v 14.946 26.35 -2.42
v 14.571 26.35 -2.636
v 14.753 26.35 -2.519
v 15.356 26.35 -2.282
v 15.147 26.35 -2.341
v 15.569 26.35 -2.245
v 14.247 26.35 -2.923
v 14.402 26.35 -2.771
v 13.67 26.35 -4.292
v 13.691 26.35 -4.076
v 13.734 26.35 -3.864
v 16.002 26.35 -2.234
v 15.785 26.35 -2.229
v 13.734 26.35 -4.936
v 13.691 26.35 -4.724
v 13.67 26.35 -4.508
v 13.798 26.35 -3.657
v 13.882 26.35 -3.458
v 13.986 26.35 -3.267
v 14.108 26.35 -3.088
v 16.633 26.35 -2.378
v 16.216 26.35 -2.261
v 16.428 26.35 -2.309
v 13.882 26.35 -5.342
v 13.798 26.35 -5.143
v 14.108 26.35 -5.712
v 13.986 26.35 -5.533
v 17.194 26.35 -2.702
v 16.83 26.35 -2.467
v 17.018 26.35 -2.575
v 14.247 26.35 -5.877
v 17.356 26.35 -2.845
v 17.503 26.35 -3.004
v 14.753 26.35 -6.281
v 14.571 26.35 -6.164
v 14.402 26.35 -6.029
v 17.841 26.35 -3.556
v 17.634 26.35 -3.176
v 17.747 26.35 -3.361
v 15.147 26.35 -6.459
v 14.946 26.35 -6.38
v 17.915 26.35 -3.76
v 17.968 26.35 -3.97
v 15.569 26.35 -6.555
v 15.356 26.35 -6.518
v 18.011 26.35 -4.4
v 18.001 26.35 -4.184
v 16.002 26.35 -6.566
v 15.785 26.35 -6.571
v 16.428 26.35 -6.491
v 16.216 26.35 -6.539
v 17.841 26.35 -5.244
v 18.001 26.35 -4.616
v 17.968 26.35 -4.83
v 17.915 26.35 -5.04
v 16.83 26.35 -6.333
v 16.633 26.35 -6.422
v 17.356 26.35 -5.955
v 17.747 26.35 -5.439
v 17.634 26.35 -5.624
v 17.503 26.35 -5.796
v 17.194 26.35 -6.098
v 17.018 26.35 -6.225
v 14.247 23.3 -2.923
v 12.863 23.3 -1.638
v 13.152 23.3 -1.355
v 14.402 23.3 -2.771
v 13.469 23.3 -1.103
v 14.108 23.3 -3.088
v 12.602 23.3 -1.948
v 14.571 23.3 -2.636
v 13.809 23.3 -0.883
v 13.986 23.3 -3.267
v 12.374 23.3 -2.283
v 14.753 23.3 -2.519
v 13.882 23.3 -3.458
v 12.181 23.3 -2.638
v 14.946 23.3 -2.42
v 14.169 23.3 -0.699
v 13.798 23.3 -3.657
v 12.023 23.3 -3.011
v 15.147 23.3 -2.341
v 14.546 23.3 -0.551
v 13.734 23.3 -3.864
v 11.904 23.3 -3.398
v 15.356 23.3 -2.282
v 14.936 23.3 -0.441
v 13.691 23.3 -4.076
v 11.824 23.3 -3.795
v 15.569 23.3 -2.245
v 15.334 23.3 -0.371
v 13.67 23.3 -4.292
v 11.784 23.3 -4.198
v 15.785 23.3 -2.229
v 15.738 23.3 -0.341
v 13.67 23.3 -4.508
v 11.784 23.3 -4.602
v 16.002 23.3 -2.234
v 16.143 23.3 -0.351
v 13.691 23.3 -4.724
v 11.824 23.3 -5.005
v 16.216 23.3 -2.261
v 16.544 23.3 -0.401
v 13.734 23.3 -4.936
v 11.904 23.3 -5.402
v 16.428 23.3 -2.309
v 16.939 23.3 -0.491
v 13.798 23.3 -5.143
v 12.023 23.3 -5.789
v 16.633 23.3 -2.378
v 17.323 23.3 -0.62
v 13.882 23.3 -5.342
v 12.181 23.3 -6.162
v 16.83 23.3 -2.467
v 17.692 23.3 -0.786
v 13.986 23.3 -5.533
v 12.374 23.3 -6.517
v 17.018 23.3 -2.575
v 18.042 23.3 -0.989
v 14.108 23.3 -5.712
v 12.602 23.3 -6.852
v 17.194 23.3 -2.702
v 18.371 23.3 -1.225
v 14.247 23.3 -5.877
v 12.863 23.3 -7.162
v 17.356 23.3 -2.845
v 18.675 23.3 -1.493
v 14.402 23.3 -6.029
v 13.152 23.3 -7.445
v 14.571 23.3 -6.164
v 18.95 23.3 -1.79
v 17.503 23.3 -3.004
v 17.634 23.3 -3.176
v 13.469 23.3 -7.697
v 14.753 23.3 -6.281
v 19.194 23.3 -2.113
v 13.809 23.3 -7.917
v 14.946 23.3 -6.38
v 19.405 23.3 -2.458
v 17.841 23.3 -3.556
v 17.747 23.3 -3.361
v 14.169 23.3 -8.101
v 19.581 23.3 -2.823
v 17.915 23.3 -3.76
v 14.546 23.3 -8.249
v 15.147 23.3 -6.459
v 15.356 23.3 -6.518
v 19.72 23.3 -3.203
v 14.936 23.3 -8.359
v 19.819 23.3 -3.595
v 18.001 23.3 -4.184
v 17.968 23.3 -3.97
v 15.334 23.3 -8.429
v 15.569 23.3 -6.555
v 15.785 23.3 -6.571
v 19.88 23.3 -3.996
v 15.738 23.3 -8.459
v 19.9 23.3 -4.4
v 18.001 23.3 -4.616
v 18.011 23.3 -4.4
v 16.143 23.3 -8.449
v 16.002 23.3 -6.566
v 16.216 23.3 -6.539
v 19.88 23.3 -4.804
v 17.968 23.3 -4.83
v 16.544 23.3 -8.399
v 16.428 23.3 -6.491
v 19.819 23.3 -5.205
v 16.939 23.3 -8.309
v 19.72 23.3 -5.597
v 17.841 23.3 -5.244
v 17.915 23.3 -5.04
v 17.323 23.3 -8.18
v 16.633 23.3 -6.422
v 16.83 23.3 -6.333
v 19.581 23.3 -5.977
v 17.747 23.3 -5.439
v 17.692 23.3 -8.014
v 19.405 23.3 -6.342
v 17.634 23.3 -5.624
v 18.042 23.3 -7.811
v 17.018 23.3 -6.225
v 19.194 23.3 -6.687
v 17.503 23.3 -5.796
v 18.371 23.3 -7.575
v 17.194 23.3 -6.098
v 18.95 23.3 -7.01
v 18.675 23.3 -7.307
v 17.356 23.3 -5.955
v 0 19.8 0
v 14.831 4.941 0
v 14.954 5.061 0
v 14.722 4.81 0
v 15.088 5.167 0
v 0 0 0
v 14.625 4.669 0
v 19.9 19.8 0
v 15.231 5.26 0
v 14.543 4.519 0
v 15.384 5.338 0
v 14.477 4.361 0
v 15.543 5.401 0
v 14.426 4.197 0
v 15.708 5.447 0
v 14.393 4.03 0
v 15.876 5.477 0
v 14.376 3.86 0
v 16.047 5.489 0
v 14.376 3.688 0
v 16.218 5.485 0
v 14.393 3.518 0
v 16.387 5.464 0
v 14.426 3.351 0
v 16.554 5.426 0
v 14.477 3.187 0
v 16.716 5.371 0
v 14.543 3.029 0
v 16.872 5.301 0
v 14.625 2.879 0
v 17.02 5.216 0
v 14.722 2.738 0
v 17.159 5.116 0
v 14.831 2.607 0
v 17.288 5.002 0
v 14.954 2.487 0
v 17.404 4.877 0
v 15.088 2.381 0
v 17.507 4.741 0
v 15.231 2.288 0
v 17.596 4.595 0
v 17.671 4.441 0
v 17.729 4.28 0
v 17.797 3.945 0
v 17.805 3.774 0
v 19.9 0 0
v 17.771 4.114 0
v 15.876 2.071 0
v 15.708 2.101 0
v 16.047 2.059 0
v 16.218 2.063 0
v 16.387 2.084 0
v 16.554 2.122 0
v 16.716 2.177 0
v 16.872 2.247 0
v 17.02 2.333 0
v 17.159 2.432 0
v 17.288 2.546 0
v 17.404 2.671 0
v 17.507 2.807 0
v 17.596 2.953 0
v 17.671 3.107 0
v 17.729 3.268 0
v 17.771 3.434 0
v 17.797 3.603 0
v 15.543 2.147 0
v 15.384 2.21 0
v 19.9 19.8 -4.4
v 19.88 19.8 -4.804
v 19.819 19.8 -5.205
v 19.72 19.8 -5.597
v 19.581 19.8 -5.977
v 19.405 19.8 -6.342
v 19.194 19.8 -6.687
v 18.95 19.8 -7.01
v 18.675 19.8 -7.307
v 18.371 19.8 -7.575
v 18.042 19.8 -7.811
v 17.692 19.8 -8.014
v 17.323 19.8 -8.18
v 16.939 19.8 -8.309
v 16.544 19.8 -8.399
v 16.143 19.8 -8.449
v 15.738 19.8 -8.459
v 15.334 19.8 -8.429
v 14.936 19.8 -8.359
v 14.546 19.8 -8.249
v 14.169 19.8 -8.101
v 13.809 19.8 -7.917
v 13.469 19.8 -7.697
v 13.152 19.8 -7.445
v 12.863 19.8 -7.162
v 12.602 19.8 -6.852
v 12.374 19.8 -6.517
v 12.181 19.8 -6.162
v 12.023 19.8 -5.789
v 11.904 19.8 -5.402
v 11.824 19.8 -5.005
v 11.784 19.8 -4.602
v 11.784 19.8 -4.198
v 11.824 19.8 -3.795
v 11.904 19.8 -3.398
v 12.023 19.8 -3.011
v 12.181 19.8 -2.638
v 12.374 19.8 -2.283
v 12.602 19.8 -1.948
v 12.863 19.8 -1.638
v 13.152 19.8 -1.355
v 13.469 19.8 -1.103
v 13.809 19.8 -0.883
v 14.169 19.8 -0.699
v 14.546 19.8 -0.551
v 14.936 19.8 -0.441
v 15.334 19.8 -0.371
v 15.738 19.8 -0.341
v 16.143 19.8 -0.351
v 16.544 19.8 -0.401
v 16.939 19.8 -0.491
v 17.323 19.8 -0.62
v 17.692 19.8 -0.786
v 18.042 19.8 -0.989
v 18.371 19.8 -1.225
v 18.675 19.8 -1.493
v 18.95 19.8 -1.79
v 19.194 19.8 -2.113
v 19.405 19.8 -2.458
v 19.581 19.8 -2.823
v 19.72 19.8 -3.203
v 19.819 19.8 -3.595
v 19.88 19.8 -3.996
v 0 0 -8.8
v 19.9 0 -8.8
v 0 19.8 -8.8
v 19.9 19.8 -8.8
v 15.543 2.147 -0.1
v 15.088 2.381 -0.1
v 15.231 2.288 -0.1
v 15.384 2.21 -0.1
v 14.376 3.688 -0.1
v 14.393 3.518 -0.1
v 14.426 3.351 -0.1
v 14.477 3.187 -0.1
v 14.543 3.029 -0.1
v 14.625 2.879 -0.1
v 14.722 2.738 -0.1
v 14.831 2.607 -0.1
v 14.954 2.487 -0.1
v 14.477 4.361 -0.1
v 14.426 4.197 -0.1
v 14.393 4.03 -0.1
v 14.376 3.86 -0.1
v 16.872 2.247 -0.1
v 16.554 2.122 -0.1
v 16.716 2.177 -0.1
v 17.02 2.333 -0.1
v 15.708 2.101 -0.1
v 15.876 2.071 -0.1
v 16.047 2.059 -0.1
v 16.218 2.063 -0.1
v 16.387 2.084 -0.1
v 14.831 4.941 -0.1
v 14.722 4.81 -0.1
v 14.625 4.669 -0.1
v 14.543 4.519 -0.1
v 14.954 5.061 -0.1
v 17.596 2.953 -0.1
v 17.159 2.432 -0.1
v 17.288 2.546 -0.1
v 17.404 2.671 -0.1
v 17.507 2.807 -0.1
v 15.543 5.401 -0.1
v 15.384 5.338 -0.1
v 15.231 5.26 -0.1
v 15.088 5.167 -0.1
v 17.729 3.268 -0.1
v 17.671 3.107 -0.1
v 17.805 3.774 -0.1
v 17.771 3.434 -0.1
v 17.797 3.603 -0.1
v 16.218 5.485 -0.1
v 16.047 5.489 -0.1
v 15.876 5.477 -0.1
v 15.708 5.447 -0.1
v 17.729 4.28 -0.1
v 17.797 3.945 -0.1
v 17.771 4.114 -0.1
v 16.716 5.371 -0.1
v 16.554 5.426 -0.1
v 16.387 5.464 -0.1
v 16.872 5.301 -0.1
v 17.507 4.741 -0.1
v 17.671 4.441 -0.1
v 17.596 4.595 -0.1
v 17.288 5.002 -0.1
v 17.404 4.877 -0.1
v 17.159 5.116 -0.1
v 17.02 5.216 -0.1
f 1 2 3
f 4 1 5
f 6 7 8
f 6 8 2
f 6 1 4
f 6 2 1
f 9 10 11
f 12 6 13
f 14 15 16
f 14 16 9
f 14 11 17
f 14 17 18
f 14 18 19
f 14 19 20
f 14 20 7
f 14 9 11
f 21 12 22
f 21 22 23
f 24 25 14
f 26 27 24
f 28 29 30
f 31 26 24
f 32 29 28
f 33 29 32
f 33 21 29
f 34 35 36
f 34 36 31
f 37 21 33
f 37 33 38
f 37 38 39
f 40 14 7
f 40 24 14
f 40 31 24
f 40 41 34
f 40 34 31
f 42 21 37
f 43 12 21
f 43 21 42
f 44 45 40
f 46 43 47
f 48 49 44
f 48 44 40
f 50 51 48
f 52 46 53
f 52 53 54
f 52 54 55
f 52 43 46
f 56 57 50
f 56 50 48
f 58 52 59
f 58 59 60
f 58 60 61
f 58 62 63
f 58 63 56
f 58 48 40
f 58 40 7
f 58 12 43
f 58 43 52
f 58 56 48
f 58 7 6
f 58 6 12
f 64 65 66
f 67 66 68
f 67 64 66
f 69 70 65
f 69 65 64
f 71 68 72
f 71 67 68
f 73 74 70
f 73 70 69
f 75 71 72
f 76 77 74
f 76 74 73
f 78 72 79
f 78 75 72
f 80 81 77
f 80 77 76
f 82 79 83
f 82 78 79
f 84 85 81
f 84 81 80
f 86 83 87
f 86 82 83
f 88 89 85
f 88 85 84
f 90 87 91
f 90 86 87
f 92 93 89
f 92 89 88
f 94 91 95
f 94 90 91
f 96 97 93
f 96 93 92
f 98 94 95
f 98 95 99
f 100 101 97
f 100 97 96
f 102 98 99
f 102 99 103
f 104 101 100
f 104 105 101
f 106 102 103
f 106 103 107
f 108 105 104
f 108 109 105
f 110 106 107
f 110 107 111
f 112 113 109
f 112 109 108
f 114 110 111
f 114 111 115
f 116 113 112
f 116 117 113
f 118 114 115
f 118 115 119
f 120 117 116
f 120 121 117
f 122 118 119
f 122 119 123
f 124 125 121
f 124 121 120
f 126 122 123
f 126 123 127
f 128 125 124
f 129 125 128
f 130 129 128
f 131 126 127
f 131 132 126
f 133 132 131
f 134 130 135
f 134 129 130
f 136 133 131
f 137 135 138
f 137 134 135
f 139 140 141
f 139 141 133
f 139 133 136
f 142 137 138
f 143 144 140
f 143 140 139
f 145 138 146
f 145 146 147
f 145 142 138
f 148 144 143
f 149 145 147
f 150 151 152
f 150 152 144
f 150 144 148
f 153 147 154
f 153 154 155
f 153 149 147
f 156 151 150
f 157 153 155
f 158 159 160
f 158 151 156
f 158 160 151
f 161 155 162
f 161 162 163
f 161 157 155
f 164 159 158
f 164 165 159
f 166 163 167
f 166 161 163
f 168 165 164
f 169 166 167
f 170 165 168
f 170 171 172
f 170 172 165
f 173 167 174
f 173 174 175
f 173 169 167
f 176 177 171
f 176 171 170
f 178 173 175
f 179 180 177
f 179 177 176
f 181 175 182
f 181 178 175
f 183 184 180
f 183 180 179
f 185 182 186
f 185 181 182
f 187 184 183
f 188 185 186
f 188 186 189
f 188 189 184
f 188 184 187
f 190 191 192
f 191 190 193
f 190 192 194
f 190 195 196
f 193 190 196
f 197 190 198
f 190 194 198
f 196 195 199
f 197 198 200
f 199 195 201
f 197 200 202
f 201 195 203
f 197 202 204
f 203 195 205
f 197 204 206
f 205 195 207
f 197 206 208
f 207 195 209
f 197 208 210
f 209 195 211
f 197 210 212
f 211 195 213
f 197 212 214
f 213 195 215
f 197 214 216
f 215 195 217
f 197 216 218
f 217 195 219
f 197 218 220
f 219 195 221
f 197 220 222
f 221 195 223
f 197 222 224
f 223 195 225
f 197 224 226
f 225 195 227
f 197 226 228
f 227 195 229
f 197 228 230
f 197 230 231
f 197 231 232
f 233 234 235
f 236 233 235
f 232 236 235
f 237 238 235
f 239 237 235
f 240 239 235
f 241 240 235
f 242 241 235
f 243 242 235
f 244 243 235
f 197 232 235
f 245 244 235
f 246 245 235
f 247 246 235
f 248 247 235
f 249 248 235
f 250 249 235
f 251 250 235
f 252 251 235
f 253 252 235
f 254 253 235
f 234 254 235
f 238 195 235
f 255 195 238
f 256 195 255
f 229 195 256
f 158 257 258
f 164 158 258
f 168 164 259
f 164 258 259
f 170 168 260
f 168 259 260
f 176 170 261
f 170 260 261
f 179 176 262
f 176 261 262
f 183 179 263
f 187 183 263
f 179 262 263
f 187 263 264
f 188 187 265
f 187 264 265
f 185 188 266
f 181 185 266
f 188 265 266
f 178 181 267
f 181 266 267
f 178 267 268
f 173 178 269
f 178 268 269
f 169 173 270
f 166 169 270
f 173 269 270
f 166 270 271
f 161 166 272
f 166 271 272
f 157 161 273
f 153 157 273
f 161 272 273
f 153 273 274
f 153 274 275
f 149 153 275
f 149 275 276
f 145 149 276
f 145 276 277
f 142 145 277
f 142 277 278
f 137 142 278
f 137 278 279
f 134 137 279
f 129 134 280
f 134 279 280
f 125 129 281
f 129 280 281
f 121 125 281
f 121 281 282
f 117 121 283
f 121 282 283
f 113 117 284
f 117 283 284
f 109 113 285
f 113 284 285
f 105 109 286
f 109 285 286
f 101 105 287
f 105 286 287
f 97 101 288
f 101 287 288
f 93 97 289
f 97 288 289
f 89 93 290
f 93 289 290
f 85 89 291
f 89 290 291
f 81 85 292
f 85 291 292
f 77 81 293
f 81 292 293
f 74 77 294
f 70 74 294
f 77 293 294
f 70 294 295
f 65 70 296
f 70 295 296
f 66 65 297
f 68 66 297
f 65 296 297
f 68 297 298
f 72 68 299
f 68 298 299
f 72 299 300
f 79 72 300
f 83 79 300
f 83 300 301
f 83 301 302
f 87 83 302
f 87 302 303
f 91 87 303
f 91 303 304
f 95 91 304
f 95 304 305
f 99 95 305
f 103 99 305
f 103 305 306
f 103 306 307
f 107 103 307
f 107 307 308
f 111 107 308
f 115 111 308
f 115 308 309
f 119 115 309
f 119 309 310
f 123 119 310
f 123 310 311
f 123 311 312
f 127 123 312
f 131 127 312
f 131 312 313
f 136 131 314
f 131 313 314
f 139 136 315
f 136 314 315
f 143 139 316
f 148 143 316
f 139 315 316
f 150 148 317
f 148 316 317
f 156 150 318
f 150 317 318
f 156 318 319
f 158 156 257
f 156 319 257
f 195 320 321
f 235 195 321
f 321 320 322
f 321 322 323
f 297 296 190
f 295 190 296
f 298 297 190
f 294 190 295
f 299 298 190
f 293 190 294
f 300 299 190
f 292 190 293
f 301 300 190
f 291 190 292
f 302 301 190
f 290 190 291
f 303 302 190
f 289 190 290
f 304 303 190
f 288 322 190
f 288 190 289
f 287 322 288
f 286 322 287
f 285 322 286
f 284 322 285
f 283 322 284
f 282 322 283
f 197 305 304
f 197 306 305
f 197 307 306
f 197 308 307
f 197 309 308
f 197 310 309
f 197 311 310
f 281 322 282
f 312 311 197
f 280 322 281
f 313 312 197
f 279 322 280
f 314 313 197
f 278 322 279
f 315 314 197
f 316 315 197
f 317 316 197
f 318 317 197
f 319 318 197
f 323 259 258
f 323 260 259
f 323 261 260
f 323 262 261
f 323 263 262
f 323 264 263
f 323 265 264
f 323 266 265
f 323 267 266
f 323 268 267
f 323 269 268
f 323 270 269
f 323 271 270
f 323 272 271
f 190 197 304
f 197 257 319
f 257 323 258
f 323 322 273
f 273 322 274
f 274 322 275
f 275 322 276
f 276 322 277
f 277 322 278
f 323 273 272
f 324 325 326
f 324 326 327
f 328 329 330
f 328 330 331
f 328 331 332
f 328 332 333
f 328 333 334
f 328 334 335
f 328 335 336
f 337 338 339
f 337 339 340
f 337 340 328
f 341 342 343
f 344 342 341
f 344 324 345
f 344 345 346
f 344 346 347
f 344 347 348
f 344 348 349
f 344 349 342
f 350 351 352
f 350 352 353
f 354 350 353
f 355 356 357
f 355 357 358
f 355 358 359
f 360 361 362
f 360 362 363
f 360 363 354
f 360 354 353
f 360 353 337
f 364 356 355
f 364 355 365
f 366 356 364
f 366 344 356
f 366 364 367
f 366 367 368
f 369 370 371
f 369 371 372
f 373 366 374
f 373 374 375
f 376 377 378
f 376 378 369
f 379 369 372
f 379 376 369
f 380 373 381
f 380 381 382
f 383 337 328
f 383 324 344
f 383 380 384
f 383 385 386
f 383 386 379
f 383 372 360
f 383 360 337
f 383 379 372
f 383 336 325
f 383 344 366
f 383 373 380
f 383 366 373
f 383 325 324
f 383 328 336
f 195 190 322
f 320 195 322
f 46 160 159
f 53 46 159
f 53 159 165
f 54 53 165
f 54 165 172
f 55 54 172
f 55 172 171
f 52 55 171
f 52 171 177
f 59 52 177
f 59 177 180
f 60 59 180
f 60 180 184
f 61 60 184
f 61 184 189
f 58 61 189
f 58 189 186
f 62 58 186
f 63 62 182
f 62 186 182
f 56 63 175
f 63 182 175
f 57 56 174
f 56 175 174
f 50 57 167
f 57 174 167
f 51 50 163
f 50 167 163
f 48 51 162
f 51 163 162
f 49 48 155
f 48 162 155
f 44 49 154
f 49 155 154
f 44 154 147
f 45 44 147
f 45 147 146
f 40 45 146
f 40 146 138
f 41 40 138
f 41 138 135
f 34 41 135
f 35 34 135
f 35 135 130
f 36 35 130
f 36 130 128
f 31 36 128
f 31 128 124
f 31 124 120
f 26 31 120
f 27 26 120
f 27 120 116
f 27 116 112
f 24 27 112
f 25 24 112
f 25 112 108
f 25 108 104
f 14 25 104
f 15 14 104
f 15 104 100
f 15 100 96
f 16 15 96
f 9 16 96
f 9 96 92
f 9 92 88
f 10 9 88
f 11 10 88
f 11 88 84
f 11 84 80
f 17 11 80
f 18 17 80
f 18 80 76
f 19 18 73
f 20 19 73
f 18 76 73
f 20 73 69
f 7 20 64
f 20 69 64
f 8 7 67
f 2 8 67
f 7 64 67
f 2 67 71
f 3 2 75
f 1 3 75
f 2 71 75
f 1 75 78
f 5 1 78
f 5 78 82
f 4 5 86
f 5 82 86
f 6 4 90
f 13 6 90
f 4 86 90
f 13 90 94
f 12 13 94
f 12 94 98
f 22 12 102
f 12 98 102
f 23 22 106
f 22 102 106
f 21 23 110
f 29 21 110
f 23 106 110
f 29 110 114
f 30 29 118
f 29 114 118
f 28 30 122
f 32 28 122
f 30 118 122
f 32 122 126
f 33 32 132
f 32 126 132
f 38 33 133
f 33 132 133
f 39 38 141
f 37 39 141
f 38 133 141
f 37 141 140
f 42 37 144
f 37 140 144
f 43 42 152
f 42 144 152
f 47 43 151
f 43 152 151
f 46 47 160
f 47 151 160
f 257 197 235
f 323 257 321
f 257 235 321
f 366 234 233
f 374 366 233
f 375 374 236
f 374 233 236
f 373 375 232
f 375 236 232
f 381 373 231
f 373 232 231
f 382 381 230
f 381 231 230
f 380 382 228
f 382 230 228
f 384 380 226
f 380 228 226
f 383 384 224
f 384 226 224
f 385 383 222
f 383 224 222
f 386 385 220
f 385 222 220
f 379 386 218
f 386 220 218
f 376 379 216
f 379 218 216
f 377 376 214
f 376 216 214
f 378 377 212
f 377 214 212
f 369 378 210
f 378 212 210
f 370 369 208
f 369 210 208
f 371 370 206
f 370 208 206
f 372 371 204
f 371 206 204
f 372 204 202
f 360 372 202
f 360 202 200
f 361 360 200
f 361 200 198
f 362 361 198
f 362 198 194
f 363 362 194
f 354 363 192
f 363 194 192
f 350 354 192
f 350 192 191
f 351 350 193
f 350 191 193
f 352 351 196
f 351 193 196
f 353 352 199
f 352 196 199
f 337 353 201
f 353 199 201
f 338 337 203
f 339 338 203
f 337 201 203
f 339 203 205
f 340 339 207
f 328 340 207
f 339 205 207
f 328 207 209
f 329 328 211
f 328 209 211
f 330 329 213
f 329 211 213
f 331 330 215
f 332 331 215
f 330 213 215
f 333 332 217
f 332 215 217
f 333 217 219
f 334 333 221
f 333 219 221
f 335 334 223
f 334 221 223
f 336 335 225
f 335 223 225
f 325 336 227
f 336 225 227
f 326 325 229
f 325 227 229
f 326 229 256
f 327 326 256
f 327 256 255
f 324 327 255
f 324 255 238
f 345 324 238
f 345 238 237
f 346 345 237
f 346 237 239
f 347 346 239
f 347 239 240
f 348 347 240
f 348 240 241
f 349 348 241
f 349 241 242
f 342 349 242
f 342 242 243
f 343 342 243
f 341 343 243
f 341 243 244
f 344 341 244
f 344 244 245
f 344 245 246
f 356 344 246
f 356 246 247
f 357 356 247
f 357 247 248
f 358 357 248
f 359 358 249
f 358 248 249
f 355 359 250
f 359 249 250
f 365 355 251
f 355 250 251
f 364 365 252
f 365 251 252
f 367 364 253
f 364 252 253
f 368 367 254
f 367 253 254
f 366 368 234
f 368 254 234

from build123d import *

# Parameters (mm, degrees)
SKETCH1_W           = 19.9
SKETCH1_H           = 8.8
BOSS_EXTRUDE1_DEPTH = 19.8
SKETCH2_R           = 2.172092228
BOSS_EXTRUDE2_DEPTH = 6.55
SKETCH3_R           = 4.06071901
BOSS_EXTRUDE3_DEPTH = 3.5
SKETCH4_R           = 1.716021907
CUT_EXTRUDE1_DEPTH  = 0.1


with BuildPart() as part:
    # Sketch1 → Boss-Extrude1 (new body)
    with BuildSketch(Plane(origin=(0, 0, 0), x_dir=(1, 0, 0), z_dir=(0, 1, 0))):
        with Locations((9.95, 4.4)):
            Rectangle(SKETCH1_W, SKETCH1_H)
    extrude(amount=BOSS_EXTRUDE1_DEPTH)

    # Sketch2 → Boss-Extrude2 (add)
    with BuildSketch(Plane(origin=(0, 19.8, 0), x_dir=(1, 0, 0), z_dir=(0, 1, 0))):
        with Locations((15.83928099, 4.4)):
            Circle(SKETCH2_R)
    extrude(amount=BOSS_EXTRUDE2_DEPTH)

    # Sketch3 → Boss-Extrude3 (add)
    with BuildSketch(Plane(origin=(0, 19.8, 0), x_dir=(1, 0, 0), z_dir=(0, 1, 0))):
        with Locations((15.83928099, 4.4)):
            Circle(SKETCH3_R)
    extrude(amount=BOSS_EXTRUDE3_DEPTH)

    # Sketch4 → Cut-Extrude1 (cut)
    with BuildSketch(Plane.XY):
        with Locations((16.089426616, 3.774002994)):
            Circle(SKETCH4_R)
    extrude(amount=-CUT_EXTRUDE1_DEPTH, mode=Mode.SUBTRACT)


solid = part.part
